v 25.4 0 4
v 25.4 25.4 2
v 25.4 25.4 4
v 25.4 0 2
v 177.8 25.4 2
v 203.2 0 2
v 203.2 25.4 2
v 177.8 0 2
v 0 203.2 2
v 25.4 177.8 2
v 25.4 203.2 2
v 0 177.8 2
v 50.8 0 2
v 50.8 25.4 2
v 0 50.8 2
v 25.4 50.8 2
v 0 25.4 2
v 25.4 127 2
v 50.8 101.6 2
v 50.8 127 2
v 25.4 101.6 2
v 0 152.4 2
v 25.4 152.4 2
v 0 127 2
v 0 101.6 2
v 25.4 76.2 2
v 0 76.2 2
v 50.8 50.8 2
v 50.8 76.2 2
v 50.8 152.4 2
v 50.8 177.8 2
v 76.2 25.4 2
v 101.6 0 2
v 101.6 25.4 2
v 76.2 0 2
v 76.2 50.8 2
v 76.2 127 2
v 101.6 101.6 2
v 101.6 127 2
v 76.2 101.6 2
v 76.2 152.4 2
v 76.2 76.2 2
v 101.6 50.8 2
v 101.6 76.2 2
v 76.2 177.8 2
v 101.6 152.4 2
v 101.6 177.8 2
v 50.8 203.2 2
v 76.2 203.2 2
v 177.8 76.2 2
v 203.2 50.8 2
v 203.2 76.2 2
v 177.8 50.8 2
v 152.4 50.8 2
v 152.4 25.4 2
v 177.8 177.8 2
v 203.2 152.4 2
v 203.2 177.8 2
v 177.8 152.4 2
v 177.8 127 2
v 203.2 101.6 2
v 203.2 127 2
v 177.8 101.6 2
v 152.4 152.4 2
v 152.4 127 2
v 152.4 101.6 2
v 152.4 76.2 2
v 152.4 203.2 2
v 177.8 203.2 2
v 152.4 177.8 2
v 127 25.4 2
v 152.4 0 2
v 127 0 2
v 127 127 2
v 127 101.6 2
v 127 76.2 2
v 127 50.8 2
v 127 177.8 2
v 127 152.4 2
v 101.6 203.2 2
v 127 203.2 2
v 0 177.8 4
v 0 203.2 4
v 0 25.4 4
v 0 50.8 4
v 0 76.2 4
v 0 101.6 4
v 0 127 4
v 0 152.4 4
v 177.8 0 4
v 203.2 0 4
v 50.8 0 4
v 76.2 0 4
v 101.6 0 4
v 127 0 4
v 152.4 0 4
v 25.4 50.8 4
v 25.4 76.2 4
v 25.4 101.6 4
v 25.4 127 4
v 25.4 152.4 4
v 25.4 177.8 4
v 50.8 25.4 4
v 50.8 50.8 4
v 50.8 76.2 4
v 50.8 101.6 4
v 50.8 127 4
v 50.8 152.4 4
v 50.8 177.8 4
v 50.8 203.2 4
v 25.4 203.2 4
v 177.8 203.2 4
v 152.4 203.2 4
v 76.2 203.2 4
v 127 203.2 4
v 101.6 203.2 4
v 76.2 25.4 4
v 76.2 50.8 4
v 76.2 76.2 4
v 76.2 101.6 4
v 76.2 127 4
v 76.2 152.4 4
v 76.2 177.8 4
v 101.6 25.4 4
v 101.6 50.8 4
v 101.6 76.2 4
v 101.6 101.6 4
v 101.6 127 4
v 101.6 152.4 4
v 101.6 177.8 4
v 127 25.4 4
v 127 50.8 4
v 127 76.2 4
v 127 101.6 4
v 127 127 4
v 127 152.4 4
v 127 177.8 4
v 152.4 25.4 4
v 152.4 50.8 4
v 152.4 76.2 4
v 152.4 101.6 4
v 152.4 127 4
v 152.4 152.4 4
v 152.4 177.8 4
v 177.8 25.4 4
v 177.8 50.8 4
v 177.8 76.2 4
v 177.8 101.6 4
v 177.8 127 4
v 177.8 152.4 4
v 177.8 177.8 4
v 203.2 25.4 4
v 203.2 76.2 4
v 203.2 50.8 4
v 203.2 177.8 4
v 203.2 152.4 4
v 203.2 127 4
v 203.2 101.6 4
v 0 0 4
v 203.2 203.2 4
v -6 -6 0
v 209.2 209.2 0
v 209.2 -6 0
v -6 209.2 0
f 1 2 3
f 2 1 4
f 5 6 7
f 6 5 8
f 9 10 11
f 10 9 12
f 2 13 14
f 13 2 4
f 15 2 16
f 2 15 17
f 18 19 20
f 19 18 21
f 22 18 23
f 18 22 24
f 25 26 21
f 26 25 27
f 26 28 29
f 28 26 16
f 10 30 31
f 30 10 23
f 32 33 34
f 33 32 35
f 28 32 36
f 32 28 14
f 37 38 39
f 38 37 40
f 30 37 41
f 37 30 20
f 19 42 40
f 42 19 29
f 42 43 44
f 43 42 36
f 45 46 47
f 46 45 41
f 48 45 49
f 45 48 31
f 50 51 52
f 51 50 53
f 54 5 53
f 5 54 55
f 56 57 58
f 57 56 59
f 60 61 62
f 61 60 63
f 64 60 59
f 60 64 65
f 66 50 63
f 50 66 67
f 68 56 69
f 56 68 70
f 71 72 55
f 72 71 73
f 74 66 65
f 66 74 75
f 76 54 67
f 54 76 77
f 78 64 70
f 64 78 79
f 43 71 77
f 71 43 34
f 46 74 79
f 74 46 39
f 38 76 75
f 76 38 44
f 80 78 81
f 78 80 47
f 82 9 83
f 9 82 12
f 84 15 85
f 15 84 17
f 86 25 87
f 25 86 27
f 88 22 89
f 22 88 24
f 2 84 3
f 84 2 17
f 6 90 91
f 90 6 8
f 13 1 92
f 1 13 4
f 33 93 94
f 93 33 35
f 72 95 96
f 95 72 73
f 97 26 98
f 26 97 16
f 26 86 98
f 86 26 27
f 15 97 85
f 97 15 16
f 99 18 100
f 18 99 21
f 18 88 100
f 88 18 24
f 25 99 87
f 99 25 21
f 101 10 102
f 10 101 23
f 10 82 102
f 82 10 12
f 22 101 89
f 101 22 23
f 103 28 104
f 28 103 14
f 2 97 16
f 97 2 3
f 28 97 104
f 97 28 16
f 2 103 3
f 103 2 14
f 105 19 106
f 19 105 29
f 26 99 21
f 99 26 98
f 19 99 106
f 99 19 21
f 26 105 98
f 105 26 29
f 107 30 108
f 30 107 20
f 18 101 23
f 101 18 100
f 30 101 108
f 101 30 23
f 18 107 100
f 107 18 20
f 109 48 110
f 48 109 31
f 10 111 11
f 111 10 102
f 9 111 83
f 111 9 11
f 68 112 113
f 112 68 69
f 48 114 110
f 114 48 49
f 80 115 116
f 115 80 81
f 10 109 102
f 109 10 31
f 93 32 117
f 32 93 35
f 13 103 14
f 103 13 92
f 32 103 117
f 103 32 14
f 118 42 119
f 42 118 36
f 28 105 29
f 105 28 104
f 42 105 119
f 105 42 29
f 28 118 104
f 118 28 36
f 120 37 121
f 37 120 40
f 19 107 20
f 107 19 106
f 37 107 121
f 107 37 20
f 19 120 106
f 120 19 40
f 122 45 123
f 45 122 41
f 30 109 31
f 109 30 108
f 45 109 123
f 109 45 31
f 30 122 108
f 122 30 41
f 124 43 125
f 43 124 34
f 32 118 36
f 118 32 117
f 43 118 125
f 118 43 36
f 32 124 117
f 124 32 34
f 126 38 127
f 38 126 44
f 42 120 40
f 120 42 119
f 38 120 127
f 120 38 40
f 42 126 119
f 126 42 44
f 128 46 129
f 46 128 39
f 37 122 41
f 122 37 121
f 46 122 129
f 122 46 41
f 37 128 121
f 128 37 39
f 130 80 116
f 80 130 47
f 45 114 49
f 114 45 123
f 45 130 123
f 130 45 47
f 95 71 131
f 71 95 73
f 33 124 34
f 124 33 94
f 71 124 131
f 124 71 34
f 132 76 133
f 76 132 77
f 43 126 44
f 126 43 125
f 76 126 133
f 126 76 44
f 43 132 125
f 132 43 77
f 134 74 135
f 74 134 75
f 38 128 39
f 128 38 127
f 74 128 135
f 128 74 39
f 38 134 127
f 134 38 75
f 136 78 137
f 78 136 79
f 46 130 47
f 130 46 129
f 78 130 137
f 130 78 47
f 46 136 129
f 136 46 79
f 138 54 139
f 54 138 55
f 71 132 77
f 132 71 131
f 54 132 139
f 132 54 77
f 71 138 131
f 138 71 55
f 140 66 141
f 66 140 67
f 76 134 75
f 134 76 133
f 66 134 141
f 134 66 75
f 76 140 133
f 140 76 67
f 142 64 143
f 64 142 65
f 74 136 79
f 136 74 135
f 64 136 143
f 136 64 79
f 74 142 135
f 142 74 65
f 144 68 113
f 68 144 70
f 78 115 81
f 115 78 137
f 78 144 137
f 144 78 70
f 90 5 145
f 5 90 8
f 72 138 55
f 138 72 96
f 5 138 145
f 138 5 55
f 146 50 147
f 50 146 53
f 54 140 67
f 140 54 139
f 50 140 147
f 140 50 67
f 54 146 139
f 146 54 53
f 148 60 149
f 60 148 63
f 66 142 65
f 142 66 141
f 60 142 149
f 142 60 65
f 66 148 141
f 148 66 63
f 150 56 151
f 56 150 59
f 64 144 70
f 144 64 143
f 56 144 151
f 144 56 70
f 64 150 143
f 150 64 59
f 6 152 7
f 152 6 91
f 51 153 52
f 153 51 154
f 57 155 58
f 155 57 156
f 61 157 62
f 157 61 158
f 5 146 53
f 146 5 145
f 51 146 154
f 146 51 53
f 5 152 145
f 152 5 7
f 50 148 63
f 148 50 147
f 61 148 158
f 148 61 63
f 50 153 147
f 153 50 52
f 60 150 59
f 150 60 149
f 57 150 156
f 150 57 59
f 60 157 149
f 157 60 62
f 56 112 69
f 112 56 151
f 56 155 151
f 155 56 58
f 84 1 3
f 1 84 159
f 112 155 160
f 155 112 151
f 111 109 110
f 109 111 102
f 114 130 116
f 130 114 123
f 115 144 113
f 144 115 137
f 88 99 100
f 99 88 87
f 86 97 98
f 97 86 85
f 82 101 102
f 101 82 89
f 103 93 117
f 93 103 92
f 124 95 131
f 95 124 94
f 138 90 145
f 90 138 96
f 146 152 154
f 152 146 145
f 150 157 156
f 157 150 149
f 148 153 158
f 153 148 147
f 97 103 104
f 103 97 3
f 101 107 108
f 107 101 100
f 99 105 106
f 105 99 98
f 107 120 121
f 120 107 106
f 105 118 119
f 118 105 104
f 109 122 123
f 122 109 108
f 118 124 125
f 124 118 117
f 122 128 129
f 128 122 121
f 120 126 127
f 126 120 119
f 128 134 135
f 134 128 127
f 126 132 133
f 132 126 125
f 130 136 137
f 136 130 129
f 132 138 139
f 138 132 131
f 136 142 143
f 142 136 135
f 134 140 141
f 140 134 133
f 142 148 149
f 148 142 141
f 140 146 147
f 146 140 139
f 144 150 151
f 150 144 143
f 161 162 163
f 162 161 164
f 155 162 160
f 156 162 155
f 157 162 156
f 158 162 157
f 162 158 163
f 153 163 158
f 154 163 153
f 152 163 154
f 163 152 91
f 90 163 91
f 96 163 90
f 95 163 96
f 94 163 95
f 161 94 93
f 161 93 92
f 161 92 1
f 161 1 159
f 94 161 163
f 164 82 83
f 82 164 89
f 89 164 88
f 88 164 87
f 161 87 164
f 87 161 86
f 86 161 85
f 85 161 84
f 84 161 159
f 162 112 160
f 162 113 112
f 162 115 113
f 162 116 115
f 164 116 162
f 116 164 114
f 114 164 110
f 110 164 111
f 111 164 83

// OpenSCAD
SQUARE_WIDTH = 25.4;
BORDER_WIDTH = 6;
BOARD_THICKNESS = 4;

module alternating_squares() {
    difference() { 
        cube([8*SQUARE_WIDTH, 8*SQUARE_WIDTH, BOARD_THICKNESS/2]);
        for(i = [0:7]) {
            for(j = [i%2 : 2 : 7]) {
                translate([i*SQUARE_WIDTH, j*SQUARE_WIDTH, 0]) cube([SQUARE_WIDTH, SQUARE_WIDTH, BOARD_THICKNESS]);
            }
        }
    };
}

module border() {
    CubePoints = [
      [  -BORDER_WIDTH,  -BORDER_WIDTH,  0 ],  //0
      [ BORDER_WIDTH+8*SQUARE_WIDTH,  -BORDER_WIDTH,  0 ],  //1
      [ BORDER_WIDTH+8*SQUARE_WIDTH,  BORDER_WIDTH+8*SQUARE_WIDTH,  0 ],  //2
      [  -BORDER_WIDTH,  BORDER_WIDTH+8*SQUARE_WIDTH,  0 ],  //3
      [  0,  0,  BOARD_THICKNESS ],  //4
      [ 8*SQUARE_WIDTH,  0,  BOARD_THICKNESS ],  //5
      [ 8*SQUARE_WIDTH,  8*SQUARE_WIDTH,  BOARD_THICKNESS ],  //6
      [  0,  8*SQUARE_WIDTH,  BOARD_THICKNESS ]]; //7
      
    CubeFaces = [
      [0,1,2,3],  // bottom
      [4,5,1,0],  // front
      [7,6,5,4],  // top
      [5,6,2,1],  // right
      [6,7,3,2],  // back
      [7,4,0,3]]; // left
      
    polyhedron( CubePoints, CubeFaces );
}

difference() {
    border();
    translate([0,0,BOARD_THICKNESS/2]) alternating_squares();
}
